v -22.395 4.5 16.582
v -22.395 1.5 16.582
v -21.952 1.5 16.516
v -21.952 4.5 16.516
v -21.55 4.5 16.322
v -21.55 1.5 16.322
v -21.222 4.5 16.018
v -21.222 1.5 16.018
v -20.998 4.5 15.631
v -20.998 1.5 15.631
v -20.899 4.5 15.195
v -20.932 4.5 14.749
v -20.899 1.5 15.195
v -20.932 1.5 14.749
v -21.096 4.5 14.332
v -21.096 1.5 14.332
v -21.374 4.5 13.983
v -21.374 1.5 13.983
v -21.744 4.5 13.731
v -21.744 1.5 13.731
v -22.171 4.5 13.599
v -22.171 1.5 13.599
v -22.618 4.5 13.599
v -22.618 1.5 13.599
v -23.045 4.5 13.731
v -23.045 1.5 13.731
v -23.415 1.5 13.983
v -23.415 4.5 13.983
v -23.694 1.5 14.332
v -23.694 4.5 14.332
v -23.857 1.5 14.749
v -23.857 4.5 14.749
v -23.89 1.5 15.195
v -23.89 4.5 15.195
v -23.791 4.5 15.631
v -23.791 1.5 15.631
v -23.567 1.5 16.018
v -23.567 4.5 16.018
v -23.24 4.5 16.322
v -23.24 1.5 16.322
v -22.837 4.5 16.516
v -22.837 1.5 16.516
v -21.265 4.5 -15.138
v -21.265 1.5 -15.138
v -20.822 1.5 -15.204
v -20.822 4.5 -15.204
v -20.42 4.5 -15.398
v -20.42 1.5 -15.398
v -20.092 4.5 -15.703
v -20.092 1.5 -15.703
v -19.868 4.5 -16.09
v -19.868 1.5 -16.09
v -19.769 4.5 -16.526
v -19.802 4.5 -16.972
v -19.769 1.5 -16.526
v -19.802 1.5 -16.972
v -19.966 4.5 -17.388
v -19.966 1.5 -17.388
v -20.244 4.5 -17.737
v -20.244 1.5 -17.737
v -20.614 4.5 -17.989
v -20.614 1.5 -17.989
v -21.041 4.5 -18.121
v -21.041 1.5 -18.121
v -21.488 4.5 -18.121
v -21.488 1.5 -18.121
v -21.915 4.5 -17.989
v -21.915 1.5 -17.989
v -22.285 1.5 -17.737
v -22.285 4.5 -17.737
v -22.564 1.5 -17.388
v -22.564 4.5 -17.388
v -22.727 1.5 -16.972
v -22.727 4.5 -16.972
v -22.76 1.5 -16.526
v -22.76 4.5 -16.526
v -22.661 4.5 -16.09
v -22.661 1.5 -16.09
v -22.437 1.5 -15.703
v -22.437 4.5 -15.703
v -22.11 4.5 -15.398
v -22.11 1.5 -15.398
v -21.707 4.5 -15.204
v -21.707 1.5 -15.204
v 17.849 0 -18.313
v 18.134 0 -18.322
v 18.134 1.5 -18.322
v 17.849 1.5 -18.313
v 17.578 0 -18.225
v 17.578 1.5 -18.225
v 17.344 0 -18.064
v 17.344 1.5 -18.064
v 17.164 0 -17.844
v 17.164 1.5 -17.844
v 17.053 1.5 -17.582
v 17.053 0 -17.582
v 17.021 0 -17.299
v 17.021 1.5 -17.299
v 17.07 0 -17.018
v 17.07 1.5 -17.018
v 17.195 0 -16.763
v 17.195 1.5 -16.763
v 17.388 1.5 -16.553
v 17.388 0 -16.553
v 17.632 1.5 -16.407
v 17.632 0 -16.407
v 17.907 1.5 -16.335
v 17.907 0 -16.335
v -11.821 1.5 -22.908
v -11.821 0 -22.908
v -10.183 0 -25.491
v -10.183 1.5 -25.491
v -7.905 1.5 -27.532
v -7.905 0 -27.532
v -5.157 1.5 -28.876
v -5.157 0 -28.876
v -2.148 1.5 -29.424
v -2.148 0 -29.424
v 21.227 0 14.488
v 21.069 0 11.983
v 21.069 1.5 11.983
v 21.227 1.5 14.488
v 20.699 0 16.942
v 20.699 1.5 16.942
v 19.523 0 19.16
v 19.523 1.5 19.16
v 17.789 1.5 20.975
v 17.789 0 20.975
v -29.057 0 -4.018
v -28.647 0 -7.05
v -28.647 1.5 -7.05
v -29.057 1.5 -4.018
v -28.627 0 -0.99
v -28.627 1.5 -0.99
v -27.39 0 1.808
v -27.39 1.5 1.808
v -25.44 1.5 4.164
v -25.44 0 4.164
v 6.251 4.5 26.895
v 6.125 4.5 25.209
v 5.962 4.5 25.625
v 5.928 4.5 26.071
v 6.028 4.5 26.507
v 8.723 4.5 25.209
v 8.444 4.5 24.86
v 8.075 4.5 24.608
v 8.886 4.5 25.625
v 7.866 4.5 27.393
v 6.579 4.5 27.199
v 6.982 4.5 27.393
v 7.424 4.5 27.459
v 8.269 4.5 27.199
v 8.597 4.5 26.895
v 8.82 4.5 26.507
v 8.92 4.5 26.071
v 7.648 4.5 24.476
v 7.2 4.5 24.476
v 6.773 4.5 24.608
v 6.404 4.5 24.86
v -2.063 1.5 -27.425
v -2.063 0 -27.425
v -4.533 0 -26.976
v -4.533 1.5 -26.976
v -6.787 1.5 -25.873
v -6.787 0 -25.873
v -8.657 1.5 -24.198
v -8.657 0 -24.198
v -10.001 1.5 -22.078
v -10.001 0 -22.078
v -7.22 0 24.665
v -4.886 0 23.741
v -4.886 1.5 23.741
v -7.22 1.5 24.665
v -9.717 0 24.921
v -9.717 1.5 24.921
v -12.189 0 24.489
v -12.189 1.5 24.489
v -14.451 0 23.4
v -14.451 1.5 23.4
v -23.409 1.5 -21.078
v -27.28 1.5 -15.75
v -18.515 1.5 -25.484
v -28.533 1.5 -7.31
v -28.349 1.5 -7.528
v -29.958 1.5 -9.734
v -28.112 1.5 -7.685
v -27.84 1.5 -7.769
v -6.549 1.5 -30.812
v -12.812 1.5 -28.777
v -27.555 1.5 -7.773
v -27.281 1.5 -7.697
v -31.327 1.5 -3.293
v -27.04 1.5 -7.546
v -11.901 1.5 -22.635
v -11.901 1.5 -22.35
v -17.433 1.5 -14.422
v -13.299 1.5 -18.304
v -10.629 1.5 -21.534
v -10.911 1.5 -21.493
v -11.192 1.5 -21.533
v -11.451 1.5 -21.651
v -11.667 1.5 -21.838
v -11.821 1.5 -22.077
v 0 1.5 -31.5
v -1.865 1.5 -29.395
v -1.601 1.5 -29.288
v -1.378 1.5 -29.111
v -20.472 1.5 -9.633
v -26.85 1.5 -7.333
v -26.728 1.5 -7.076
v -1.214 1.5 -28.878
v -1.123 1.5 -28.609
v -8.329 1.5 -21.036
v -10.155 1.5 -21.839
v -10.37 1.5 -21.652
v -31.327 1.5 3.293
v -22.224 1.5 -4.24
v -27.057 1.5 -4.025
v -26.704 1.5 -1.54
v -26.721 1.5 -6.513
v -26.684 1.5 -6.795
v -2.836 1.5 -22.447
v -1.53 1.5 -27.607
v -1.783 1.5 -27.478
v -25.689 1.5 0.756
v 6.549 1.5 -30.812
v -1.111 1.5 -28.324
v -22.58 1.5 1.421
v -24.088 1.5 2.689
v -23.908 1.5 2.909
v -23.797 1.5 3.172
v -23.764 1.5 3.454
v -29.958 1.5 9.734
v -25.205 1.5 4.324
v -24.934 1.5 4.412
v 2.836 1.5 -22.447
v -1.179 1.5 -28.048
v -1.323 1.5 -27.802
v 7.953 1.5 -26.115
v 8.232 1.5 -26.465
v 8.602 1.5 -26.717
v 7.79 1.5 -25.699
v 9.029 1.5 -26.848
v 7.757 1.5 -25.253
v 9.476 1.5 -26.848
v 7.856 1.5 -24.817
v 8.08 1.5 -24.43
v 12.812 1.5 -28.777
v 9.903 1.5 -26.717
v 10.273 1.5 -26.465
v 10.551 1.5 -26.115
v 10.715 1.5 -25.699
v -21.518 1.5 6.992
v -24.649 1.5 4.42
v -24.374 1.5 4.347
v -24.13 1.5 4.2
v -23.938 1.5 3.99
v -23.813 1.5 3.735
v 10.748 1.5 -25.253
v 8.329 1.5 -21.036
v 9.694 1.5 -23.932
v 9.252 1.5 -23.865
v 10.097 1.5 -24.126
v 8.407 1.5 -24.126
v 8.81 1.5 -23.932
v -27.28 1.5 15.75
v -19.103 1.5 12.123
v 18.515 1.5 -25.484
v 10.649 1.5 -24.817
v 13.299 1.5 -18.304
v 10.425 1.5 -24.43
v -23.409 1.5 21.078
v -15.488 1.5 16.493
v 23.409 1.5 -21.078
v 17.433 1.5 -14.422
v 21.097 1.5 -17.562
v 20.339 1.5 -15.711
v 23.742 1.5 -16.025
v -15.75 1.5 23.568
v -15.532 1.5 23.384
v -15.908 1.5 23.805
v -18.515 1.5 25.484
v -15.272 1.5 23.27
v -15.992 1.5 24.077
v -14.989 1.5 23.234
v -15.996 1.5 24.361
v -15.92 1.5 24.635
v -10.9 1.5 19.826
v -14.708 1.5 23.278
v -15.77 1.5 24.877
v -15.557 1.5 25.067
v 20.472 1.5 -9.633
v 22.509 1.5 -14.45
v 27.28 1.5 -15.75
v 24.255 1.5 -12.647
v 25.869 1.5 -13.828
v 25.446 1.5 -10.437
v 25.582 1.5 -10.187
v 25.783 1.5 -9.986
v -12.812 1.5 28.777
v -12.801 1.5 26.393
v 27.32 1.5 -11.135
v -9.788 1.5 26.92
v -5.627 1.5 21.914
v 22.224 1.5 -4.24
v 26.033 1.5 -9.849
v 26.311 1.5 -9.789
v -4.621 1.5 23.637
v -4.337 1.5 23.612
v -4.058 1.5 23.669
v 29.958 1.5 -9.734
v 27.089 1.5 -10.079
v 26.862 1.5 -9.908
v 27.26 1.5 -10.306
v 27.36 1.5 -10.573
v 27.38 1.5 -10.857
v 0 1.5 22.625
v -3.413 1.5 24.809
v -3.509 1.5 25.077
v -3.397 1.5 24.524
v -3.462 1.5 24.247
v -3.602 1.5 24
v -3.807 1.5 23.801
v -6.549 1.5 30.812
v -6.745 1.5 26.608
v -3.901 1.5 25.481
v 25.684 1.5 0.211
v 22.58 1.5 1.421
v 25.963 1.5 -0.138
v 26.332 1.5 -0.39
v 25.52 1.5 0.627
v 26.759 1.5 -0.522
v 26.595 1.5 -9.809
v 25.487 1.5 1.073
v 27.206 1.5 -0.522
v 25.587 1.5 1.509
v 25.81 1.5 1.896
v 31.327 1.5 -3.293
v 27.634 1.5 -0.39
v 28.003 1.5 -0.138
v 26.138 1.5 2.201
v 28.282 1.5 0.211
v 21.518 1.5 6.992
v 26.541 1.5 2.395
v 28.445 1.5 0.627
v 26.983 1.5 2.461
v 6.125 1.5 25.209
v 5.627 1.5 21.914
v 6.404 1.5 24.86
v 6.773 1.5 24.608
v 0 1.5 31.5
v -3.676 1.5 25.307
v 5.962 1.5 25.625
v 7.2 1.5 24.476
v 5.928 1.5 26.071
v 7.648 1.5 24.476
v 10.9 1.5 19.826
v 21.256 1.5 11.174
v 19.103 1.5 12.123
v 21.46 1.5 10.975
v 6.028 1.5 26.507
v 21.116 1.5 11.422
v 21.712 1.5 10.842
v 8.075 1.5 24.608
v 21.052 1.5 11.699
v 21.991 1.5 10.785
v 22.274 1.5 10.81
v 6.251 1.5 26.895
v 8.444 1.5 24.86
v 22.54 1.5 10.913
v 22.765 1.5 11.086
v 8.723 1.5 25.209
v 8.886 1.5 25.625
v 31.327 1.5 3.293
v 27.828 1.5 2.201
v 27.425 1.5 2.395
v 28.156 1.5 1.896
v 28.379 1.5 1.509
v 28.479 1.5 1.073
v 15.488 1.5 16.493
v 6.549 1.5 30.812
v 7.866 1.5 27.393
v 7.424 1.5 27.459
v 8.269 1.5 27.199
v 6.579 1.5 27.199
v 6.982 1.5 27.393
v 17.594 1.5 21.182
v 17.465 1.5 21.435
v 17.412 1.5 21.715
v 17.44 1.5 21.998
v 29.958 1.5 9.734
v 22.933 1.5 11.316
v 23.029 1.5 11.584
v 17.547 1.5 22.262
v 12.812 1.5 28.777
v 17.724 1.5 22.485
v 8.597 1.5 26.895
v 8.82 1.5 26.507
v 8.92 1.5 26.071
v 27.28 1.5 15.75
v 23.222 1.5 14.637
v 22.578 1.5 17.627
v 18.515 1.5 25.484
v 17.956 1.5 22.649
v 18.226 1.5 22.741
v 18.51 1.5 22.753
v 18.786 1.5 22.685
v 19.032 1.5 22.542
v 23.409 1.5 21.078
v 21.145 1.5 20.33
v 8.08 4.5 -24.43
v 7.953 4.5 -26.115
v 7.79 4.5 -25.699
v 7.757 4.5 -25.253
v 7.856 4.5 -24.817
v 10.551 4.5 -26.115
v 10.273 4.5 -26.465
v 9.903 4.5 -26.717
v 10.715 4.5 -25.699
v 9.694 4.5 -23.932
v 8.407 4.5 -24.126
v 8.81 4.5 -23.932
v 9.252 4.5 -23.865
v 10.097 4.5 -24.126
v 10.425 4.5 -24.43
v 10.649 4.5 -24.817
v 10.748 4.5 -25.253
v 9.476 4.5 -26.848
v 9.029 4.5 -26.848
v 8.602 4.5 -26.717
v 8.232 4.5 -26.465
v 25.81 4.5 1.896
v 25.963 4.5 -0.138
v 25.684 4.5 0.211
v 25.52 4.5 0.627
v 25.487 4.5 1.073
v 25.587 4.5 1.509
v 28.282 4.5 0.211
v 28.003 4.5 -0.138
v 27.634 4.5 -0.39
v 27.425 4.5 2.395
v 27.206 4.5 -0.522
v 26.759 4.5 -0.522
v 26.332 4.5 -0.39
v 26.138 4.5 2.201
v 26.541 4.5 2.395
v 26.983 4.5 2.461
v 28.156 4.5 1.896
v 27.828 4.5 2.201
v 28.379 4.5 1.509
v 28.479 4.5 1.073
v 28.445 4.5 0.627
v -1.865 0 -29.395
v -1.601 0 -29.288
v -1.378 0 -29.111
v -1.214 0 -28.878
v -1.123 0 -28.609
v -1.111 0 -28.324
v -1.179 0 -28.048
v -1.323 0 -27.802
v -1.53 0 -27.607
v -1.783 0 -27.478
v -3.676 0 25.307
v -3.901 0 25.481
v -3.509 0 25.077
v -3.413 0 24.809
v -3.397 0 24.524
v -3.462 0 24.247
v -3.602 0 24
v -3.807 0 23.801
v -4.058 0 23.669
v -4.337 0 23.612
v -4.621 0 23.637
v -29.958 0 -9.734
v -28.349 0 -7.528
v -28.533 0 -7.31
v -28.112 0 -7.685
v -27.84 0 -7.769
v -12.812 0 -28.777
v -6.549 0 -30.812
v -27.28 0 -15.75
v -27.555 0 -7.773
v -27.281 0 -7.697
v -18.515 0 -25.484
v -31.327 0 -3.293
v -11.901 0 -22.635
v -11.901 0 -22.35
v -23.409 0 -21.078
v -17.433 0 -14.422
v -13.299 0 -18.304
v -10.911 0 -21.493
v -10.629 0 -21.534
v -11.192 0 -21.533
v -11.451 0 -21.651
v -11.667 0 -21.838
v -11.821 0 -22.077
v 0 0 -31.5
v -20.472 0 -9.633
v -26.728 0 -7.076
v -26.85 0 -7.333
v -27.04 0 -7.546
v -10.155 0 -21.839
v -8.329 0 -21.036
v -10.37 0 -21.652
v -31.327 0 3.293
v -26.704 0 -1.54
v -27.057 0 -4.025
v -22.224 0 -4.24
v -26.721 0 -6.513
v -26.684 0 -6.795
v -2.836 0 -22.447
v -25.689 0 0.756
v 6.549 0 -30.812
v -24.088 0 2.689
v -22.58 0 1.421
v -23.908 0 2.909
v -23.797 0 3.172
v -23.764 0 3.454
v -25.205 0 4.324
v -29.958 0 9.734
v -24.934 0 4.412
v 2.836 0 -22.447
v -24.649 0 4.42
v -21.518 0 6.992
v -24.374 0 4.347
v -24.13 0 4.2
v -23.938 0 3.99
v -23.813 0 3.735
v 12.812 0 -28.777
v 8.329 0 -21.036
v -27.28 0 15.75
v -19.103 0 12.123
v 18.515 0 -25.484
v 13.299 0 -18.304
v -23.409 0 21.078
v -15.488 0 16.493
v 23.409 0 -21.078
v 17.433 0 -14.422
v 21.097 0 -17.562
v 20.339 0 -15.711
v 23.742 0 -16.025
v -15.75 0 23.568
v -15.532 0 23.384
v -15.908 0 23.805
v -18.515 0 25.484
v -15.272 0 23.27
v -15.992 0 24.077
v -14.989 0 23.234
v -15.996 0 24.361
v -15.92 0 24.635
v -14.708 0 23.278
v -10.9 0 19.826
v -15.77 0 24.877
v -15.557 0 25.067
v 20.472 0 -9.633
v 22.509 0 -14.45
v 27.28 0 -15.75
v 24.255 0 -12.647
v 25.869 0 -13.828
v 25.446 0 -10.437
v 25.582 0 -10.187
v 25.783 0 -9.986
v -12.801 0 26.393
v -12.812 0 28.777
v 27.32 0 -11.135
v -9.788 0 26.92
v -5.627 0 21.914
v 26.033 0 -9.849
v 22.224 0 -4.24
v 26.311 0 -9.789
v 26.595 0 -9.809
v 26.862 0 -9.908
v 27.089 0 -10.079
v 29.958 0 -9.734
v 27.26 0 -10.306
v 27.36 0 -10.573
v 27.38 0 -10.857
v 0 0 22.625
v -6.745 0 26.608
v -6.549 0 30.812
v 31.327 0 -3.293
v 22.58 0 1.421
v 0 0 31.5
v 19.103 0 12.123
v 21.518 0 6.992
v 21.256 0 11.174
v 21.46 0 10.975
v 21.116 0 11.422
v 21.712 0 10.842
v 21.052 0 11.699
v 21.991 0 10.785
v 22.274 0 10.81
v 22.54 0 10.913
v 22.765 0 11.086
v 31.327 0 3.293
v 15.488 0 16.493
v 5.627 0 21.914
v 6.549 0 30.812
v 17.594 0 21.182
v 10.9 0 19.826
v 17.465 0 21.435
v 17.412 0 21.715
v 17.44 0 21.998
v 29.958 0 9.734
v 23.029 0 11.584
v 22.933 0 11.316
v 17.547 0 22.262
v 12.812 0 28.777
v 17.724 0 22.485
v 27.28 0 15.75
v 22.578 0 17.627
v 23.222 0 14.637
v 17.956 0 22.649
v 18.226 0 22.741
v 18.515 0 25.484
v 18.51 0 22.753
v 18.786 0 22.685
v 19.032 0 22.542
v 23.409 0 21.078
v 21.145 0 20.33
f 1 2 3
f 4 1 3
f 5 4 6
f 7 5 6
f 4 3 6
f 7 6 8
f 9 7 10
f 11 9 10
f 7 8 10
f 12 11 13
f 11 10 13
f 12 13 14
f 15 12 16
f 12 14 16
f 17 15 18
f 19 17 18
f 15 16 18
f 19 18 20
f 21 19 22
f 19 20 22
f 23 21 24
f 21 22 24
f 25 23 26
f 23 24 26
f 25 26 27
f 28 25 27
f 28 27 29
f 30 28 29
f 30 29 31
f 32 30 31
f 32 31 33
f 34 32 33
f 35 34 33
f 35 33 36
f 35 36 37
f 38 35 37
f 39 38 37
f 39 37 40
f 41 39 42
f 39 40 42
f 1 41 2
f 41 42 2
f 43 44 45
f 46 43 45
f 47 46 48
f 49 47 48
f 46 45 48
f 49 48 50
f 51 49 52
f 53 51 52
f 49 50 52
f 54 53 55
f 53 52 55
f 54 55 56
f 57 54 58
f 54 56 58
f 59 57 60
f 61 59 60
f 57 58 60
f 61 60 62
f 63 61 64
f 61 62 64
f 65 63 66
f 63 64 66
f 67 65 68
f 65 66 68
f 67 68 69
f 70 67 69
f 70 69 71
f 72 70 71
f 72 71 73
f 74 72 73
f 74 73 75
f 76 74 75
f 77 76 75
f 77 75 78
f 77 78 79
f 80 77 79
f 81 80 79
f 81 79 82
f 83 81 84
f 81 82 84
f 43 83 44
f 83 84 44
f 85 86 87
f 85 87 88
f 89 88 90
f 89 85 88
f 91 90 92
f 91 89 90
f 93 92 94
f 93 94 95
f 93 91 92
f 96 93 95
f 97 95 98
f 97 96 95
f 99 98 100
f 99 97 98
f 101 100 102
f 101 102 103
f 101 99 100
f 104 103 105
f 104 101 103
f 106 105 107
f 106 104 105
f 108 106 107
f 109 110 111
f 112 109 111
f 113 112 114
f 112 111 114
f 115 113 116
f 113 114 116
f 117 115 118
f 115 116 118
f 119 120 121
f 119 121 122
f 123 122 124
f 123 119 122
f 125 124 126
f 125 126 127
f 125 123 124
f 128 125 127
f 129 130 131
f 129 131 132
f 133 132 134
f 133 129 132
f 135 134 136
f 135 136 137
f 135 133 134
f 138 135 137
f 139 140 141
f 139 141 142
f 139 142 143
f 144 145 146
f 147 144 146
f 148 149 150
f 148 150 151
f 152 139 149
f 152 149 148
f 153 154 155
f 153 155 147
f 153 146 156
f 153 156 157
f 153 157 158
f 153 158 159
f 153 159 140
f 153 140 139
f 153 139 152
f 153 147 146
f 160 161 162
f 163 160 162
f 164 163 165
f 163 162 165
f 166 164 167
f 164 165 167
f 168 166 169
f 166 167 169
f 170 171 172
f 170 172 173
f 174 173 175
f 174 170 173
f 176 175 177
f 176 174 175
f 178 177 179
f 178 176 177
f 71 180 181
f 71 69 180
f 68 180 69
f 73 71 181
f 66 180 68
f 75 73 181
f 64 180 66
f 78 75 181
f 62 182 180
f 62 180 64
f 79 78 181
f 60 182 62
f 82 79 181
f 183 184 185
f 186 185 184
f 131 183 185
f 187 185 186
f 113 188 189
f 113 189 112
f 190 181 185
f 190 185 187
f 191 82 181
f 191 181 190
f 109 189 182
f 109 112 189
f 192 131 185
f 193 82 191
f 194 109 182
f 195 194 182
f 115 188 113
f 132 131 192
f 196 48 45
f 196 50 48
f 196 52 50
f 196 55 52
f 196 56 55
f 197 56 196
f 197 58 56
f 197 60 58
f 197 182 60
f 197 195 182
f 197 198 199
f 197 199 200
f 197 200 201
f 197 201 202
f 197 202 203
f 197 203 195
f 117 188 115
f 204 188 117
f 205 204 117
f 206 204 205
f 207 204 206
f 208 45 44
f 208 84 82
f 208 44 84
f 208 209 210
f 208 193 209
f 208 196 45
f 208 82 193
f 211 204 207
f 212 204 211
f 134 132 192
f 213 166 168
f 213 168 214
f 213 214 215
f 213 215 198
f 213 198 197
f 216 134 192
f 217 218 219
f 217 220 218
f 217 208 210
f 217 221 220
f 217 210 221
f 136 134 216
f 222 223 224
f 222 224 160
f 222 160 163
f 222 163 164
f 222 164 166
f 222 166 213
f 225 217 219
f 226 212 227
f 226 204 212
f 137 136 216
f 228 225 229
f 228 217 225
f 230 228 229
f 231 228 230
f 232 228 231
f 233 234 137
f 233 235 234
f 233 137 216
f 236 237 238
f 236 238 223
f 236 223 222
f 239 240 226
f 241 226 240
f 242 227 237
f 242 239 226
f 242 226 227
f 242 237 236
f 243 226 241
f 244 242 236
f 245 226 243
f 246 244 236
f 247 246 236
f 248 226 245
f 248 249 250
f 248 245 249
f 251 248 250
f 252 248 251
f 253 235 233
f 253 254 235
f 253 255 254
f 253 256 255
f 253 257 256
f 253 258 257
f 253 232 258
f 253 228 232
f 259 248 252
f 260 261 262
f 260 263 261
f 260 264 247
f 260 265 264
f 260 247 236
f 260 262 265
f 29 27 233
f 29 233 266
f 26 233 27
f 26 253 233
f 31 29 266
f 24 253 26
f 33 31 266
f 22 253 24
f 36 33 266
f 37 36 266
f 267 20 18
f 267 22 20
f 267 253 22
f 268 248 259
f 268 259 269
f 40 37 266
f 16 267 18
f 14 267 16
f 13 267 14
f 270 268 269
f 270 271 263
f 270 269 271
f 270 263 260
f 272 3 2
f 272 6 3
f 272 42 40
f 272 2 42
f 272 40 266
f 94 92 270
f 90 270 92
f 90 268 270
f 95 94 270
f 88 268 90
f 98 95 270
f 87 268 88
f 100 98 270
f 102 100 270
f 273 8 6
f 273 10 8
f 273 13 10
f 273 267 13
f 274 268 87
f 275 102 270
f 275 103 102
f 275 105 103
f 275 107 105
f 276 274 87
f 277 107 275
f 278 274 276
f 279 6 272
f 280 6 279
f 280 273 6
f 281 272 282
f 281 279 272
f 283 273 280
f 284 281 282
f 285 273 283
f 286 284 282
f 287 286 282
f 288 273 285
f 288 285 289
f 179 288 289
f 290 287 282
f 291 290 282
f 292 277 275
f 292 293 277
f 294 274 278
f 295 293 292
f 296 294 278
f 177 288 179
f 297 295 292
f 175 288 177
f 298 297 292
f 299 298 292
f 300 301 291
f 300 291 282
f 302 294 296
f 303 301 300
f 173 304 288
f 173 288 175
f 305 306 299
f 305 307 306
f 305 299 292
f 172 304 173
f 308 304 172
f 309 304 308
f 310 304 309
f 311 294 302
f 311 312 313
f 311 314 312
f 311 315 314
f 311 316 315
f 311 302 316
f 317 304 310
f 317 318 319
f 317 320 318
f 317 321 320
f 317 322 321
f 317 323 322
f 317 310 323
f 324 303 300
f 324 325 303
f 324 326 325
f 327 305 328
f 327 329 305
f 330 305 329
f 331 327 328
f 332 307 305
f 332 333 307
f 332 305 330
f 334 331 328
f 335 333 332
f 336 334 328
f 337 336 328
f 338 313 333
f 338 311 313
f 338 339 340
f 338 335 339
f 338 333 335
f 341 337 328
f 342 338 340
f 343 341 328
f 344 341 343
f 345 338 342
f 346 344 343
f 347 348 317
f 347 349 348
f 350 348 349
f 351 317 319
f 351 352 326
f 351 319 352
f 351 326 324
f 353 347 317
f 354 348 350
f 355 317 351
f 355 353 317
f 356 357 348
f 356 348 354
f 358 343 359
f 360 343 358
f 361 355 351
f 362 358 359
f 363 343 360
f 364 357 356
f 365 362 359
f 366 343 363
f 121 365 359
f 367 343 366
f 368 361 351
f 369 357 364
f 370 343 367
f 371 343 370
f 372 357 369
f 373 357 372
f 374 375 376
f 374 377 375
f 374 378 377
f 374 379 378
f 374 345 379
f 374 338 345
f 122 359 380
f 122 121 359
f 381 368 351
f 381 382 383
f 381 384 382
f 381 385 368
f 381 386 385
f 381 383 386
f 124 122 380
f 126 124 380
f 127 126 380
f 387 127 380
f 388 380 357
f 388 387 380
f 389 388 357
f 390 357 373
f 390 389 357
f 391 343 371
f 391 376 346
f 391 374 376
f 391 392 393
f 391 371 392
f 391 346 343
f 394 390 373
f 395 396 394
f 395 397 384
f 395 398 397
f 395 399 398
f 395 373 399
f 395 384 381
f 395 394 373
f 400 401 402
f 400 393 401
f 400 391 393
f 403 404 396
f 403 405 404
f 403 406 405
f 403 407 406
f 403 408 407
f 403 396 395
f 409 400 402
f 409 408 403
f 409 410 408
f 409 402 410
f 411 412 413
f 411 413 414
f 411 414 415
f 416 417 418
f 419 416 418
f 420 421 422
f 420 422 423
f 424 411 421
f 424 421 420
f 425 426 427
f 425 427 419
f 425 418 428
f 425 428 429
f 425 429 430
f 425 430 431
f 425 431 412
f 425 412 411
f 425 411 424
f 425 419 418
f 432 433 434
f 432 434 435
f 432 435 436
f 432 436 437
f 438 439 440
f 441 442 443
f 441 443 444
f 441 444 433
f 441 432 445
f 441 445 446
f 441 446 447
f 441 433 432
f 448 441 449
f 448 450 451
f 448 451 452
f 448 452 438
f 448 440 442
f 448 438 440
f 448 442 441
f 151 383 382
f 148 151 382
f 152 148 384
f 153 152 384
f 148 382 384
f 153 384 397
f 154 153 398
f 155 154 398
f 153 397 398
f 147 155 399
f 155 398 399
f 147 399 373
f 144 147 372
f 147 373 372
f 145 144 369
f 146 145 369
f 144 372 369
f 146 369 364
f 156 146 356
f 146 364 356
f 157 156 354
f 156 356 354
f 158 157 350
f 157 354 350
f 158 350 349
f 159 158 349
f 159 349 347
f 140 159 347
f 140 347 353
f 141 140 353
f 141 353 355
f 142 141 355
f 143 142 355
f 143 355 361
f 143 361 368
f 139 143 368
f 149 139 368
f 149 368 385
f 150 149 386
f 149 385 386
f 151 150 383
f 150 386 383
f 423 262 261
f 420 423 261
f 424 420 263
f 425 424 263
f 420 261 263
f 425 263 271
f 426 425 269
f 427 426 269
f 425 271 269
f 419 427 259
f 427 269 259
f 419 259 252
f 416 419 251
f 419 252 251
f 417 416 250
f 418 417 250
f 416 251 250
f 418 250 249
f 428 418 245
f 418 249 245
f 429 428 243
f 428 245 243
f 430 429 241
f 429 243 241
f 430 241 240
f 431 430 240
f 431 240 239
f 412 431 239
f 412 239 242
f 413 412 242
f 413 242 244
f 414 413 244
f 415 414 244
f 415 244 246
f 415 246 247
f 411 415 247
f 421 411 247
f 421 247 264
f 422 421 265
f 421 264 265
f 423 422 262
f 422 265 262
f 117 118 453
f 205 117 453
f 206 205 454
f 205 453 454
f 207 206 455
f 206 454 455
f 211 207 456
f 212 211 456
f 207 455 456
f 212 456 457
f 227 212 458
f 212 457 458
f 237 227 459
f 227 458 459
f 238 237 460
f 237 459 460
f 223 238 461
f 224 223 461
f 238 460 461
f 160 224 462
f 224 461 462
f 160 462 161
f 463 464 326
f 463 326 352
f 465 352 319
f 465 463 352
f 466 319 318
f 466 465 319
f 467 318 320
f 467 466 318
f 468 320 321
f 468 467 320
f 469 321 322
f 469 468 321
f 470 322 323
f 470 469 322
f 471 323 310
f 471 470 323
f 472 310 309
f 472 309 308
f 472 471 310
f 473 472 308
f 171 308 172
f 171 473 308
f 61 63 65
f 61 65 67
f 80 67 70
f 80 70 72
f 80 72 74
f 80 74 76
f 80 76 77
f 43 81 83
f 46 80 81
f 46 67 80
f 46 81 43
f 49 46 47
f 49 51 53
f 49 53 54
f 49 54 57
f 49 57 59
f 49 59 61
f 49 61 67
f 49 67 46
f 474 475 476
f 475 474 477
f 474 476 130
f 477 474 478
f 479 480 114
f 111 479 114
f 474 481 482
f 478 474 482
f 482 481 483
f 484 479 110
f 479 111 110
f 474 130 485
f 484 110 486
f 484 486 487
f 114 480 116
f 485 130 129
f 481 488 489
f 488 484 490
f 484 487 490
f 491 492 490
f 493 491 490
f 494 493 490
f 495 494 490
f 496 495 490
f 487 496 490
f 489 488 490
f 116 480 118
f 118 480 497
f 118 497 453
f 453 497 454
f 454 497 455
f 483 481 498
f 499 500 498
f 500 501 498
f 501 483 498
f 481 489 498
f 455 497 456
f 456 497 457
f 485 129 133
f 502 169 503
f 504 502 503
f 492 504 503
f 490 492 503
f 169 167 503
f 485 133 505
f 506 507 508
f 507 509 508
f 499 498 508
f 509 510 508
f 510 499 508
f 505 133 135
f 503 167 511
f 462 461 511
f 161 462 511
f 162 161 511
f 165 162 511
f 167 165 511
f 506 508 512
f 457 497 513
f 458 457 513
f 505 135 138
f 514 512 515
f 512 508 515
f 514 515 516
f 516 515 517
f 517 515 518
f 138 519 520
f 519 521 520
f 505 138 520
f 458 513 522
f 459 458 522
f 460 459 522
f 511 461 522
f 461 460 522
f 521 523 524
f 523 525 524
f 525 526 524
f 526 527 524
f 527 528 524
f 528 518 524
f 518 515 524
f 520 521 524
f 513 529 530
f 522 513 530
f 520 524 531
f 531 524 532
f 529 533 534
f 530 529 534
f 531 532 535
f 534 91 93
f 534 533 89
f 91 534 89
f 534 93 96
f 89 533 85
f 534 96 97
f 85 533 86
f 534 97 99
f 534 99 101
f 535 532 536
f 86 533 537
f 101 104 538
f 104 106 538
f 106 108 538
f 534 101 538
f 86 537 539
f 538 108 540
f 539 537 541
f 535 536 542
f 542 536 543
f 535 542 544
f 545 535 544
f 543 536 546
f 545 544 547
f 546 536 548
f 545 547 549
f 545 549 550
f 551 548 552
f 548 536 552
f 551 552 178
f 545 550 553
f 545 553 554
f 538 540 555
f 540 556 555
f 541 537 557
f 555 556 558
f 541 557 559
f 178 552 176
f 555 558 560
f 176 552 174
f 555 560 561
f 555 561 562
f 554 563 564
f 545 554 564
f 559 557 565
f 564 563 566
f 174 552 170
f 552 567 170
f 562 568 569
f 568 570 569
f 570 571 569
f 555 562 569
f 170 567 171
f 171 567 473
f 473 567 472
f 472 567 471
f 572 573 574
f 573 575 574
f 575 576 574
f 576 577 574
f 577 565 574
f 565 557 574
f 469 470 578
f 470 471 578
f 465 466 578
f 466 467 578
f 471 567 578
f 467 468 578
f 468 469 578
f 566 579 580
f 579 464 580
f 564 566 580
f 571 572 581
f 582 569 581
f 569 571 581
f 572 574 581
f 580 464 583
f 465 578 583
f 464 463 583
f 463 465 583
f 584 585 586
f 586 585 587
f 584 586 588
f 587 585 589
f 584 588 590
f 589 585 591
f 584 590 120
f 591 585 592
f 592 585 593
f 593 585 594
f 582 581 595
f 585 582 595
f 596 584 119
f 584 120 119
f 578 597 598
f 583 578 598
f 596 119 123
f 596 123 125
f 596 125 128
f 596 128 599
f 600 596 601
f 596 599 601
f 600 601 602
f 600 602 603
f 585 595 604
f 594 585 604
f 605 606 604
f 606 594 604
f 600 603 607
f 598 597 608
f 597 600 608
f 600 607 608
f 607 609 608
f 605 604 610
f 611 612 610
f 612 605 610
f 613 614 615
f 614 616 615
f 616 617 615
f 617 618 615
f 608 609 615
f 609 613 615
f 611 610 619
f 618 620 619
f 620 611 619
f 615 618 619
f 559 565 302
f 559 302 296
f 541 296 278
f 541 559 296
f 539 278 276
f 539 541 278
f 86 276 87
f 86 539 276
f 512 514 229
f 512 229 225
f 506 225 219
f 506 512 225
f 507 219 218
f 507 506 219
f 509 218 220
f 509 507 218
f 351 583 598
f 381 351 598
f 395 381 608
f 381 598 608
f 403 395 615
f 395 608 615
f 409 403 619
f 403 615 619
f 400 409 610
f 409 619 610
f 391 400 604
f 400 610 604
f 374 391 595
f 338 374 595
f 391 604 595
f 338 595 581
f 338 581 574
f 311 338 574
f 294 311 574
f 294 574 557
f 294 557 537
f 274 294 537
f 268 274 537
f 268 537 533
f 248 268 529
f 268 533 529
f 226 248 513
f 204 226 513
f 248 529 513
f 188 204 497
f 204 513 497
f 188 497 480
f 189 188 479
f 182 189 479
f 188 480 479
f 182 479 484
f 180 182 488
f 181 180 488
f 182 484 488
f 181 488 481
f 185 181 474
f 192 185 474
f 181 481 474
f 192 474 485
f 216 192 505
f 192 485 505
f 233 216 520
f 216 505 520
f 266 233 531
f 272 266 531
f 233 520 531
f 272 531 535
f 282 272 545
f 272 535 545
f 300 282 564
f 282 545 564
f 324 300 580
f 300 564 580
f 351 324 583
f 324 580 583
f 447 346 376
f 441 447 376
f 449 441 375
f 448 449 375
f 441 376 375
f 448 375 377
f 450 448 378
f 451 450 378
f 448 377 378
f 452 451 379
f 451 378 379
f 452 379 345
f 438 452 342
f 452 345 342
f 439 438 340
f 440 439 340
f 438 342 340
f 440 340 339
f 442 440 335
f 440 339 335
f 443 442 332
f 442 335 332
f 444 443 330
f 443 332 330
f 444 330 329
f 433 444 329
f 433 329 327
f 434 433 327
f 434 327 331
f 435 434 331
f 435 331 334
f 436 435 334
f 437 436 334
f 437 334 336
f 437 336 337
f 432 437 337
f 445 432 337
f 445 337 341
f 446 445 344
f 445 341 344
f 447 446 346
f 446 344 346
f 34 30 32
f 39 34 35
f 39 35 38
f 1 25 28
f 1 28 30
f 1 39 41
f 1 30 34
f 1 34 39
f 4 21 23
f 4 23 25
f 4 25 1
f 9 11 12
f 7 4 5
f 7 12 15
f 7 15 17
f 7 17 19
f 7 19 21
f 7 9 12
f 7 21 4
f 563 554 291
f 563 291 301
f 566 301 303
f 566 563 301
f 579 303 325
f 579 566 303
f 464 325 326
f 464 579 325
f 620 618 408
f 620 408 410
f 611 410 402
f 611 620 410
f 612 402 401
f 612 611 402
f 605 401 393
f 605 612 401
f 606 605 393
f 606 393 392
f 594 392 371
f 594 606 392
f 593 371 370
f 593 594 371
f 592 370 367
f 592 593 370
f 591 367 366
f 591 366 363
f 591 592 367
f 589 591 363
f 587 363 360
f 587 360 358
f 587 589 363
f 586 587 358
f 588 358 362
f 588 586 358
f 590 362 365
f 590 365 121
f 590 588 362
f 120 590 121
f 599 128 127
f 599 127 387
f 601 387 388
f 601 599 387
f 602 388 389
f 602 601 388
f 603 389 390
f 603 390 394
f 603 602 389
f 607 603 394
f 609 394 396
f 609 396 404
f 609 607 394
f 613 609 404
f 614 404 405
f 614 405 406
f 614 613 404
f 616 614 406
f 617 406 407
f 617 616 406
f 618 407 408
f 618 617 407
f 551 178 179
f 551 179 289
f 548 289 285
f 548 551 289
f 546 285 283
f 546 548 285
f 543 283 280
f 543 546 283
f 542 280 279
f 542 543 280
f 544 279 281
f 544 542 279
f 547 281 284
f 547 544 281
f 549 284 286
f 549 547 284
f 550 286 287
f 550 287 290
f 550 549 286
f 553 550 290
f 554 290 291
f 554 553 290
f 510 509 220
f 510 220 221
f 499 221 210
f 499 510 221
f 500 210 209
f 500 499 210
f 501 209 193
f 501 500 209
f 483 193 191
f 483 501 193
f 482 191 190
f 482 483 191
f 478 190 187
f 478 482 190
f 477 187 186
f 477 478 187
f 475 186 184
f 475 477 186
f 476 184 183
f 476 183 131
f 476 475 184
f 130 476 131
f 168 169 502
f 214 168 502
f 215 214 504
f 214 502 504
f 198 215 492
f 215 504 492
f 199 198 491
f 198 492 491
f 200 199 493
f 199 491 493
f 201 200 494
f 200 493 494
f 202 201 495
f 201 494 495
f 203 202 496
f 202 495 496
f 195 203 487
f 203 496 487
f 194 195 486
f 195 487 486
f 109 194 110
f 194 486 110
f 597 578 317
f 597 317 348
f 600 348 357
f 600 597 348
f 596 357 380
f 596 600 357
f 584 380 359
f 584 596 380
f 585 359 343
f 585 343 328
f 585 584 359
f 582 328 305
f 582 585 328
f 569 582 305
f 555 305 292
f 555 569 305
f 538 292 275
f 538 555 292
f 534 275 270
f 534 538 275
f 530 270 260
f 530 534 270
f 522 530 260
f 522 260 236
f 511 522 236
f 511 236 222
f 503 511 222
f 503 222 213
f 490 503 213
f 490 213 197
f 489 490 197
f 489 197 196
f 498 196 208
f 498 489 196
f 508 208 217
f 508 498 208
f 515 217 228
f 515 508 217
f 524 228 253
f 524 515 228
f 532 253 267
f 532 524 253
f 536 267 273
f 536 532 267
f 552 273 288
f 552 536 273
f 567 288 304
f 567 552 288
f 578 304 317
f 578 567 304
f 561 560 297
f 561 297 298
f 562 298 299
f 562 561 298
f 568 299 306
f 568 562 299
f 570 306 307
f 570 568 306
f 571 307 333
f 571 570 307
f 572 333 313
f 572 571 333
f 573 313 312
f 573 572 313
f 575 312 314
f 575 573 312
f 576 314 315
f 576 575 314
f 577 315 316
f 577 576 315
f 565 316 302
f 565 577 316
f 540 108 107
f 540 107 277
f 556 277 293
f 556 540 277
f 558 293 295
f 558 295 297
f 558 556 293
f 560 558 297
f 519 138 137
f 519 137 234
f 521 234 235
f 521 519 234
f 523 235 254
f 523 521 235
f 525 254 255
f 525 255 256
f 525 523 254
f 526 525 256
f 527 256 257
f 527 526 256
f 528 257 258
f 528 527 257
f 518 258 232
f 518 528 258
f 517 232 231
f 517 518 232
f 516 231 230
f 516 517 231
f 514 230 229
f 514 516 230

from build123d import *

# Parameters (mm, degrees)
SKETCH1_R           = 31.5
SKETCH1_R_2         = 22.625
BOSS_EXTRUDE1_DEPTH = 1.5
SKETCH2_R           = 1.5
BOSS_EXTRUDE2_DEPTH = 3


with BuildPart() as part:
    # Sketch1 → Boss-Extrude1 (new body)
    with BuildSketch(Plane(origin=(0, 0, 0), x_dir=(1, 0, 0), z_dir=(0, 1, 0))):
        with Locations(Location((0, 0, 0), (0, 0, 270))):
            Circle(SKETCH1_R)
        with Locations(Location((0, 0, 0), (0, 0, 270))):
            Circle(SKETCH1_R_2, mode=Mode.SUBTRACT)
        with BuildLine():
            ThreePointArc((-11.821381939, 22.907790728), (-7.904609513, 27.531658188), (-2.147738601, 29.423666069))
            ThreePointArc((-2.147738601, 29.423666069), (-1.106349013, 28.466844389), (-2.063170693, 27.425454801))
            ThreePointArc((-2.063170693, 27.425454801), (-6.78729401, 25.872861616), (-10.001421306, 22.07848783))
            ThreePointArc((-10.001421306, 22.07848783), (-11.326053072, 21.583158963), (-11.821381939, 22.907790728))
        make_face(mode=Mode.SUBTRACT)
        with BuildLine():
            ThreePointArc((17.907280569, 16.334544855), (22.509164441, 14.450254128), (25.445602695, 10.437123544))
            ThreePointArc((25.445602695, 10.437123544), (26.731697208, 9.848939131), (27.319881621, 11.135033644))
            ThreePointArc((27.319881621, 11.135033644), (23.741504251, 16.02548065), (18.13359573, 18.321698963))
            ThreePointArc((18.13359573, 18.321698963), (17.026861096, 17.44127949), (17.907280569, 16.334544855))
        make_face(mode=Mode.SUBTRACT)
        with BuildLine():
            ThreePointArc((21.068729344, -11.983183919), (20.698722692, -16.942113419), (17.789418023, -20.974957706))
            ThreePointArc((17.789418023, -20.974957706), (17.627446465, -22.379865253), (19.032354011, -22.541836811))
            ThreePointArc((19.032354011, -22.541836811), (22.577666084, -17.62736646), (23.028560438, -11.584358037))
            ThreePointArc((23.028560438, -11.584358037), (21.849231951, -10.803855431), (21.068729344, -11.983183919))
        make_face(mode=Mode.SUBTRACT)
        with BuildLine():
            ThreePointArc((-4.886089735, -23.74055981), (-9.716650293, -24.921056063), (-14.451137717, -23.400360319))
            ThreePointArc((-14.451137717, -23.400360319), (-15.837336158, -23.680456521), (-15.557239956, -25.066654962))
            ThreePointArc((-15.557239956, -25.066654962), (-9.787739224, -26.919792254), (-3.901162667, -25.481225968))
            ThreePointArc((-3.901162667, -25.481225968), (-3.523293122, -24.118429356), (-4.886089735, -23.74055981))
        make_face(mode=Mode.SUBTRACT)
        with BuildLine():
            ThreePointArc((-24.088498872, -2.689288956), (-26.70394283, 1.540053737), (-26.720712308, 6.51273968))
            ThreePointArc((-26.720712308, 6.51273968), (-27.415458501, 7.744538254), (-28.647257075, 7.04979206))
            ThreePointArc((-28.647257075, 7.04979206), (-28.626821597, 0.990019877), (-25.439611562, -4.163905686))
            ThreePointArc((-25.439611562, -4.163905686), (-24.026746852, -4.102153666), (-24.088498872, -2.689288956))
        make_face(mode=Mode.SUBTRACT)
    extrude(amount=BOSS_EXTRUDE1_DEPTH)

    # Sketch2 → Boss-Extrude2 (add)
    with BuildSketch(Plane(origin=(0, 1.5, 0), x_dir=(1, 0, 0), z_dir=(0, 1, 0))):
        with Locations(Location((-21.264622422, 16.637783303, 0), (0, 0, 270))):
            Circle(SKETCH2_R)
        with Locations(Location((9.252342519, 25.365215511, 0), (0, 0, 270))):
            Circle(SKETCH2_R)
        with Locations(Location((26.982884575, -0.961217985, 0), (0, 0, 270))):
            Circle(SKETCH2_R)
        with Locations(Location((7.423997262, -25.959280896, 0), (0, 0, 270))):
            Circle(SKETCH2_R)
        with Locations(Location((-22.394601934, -15.082499932, 0), (0, 0, 270))):
            Circle(SKETCH2_R)
    extrude(amount=BOSS_EXTRUDE2_DEPTH)


solid = part.part
